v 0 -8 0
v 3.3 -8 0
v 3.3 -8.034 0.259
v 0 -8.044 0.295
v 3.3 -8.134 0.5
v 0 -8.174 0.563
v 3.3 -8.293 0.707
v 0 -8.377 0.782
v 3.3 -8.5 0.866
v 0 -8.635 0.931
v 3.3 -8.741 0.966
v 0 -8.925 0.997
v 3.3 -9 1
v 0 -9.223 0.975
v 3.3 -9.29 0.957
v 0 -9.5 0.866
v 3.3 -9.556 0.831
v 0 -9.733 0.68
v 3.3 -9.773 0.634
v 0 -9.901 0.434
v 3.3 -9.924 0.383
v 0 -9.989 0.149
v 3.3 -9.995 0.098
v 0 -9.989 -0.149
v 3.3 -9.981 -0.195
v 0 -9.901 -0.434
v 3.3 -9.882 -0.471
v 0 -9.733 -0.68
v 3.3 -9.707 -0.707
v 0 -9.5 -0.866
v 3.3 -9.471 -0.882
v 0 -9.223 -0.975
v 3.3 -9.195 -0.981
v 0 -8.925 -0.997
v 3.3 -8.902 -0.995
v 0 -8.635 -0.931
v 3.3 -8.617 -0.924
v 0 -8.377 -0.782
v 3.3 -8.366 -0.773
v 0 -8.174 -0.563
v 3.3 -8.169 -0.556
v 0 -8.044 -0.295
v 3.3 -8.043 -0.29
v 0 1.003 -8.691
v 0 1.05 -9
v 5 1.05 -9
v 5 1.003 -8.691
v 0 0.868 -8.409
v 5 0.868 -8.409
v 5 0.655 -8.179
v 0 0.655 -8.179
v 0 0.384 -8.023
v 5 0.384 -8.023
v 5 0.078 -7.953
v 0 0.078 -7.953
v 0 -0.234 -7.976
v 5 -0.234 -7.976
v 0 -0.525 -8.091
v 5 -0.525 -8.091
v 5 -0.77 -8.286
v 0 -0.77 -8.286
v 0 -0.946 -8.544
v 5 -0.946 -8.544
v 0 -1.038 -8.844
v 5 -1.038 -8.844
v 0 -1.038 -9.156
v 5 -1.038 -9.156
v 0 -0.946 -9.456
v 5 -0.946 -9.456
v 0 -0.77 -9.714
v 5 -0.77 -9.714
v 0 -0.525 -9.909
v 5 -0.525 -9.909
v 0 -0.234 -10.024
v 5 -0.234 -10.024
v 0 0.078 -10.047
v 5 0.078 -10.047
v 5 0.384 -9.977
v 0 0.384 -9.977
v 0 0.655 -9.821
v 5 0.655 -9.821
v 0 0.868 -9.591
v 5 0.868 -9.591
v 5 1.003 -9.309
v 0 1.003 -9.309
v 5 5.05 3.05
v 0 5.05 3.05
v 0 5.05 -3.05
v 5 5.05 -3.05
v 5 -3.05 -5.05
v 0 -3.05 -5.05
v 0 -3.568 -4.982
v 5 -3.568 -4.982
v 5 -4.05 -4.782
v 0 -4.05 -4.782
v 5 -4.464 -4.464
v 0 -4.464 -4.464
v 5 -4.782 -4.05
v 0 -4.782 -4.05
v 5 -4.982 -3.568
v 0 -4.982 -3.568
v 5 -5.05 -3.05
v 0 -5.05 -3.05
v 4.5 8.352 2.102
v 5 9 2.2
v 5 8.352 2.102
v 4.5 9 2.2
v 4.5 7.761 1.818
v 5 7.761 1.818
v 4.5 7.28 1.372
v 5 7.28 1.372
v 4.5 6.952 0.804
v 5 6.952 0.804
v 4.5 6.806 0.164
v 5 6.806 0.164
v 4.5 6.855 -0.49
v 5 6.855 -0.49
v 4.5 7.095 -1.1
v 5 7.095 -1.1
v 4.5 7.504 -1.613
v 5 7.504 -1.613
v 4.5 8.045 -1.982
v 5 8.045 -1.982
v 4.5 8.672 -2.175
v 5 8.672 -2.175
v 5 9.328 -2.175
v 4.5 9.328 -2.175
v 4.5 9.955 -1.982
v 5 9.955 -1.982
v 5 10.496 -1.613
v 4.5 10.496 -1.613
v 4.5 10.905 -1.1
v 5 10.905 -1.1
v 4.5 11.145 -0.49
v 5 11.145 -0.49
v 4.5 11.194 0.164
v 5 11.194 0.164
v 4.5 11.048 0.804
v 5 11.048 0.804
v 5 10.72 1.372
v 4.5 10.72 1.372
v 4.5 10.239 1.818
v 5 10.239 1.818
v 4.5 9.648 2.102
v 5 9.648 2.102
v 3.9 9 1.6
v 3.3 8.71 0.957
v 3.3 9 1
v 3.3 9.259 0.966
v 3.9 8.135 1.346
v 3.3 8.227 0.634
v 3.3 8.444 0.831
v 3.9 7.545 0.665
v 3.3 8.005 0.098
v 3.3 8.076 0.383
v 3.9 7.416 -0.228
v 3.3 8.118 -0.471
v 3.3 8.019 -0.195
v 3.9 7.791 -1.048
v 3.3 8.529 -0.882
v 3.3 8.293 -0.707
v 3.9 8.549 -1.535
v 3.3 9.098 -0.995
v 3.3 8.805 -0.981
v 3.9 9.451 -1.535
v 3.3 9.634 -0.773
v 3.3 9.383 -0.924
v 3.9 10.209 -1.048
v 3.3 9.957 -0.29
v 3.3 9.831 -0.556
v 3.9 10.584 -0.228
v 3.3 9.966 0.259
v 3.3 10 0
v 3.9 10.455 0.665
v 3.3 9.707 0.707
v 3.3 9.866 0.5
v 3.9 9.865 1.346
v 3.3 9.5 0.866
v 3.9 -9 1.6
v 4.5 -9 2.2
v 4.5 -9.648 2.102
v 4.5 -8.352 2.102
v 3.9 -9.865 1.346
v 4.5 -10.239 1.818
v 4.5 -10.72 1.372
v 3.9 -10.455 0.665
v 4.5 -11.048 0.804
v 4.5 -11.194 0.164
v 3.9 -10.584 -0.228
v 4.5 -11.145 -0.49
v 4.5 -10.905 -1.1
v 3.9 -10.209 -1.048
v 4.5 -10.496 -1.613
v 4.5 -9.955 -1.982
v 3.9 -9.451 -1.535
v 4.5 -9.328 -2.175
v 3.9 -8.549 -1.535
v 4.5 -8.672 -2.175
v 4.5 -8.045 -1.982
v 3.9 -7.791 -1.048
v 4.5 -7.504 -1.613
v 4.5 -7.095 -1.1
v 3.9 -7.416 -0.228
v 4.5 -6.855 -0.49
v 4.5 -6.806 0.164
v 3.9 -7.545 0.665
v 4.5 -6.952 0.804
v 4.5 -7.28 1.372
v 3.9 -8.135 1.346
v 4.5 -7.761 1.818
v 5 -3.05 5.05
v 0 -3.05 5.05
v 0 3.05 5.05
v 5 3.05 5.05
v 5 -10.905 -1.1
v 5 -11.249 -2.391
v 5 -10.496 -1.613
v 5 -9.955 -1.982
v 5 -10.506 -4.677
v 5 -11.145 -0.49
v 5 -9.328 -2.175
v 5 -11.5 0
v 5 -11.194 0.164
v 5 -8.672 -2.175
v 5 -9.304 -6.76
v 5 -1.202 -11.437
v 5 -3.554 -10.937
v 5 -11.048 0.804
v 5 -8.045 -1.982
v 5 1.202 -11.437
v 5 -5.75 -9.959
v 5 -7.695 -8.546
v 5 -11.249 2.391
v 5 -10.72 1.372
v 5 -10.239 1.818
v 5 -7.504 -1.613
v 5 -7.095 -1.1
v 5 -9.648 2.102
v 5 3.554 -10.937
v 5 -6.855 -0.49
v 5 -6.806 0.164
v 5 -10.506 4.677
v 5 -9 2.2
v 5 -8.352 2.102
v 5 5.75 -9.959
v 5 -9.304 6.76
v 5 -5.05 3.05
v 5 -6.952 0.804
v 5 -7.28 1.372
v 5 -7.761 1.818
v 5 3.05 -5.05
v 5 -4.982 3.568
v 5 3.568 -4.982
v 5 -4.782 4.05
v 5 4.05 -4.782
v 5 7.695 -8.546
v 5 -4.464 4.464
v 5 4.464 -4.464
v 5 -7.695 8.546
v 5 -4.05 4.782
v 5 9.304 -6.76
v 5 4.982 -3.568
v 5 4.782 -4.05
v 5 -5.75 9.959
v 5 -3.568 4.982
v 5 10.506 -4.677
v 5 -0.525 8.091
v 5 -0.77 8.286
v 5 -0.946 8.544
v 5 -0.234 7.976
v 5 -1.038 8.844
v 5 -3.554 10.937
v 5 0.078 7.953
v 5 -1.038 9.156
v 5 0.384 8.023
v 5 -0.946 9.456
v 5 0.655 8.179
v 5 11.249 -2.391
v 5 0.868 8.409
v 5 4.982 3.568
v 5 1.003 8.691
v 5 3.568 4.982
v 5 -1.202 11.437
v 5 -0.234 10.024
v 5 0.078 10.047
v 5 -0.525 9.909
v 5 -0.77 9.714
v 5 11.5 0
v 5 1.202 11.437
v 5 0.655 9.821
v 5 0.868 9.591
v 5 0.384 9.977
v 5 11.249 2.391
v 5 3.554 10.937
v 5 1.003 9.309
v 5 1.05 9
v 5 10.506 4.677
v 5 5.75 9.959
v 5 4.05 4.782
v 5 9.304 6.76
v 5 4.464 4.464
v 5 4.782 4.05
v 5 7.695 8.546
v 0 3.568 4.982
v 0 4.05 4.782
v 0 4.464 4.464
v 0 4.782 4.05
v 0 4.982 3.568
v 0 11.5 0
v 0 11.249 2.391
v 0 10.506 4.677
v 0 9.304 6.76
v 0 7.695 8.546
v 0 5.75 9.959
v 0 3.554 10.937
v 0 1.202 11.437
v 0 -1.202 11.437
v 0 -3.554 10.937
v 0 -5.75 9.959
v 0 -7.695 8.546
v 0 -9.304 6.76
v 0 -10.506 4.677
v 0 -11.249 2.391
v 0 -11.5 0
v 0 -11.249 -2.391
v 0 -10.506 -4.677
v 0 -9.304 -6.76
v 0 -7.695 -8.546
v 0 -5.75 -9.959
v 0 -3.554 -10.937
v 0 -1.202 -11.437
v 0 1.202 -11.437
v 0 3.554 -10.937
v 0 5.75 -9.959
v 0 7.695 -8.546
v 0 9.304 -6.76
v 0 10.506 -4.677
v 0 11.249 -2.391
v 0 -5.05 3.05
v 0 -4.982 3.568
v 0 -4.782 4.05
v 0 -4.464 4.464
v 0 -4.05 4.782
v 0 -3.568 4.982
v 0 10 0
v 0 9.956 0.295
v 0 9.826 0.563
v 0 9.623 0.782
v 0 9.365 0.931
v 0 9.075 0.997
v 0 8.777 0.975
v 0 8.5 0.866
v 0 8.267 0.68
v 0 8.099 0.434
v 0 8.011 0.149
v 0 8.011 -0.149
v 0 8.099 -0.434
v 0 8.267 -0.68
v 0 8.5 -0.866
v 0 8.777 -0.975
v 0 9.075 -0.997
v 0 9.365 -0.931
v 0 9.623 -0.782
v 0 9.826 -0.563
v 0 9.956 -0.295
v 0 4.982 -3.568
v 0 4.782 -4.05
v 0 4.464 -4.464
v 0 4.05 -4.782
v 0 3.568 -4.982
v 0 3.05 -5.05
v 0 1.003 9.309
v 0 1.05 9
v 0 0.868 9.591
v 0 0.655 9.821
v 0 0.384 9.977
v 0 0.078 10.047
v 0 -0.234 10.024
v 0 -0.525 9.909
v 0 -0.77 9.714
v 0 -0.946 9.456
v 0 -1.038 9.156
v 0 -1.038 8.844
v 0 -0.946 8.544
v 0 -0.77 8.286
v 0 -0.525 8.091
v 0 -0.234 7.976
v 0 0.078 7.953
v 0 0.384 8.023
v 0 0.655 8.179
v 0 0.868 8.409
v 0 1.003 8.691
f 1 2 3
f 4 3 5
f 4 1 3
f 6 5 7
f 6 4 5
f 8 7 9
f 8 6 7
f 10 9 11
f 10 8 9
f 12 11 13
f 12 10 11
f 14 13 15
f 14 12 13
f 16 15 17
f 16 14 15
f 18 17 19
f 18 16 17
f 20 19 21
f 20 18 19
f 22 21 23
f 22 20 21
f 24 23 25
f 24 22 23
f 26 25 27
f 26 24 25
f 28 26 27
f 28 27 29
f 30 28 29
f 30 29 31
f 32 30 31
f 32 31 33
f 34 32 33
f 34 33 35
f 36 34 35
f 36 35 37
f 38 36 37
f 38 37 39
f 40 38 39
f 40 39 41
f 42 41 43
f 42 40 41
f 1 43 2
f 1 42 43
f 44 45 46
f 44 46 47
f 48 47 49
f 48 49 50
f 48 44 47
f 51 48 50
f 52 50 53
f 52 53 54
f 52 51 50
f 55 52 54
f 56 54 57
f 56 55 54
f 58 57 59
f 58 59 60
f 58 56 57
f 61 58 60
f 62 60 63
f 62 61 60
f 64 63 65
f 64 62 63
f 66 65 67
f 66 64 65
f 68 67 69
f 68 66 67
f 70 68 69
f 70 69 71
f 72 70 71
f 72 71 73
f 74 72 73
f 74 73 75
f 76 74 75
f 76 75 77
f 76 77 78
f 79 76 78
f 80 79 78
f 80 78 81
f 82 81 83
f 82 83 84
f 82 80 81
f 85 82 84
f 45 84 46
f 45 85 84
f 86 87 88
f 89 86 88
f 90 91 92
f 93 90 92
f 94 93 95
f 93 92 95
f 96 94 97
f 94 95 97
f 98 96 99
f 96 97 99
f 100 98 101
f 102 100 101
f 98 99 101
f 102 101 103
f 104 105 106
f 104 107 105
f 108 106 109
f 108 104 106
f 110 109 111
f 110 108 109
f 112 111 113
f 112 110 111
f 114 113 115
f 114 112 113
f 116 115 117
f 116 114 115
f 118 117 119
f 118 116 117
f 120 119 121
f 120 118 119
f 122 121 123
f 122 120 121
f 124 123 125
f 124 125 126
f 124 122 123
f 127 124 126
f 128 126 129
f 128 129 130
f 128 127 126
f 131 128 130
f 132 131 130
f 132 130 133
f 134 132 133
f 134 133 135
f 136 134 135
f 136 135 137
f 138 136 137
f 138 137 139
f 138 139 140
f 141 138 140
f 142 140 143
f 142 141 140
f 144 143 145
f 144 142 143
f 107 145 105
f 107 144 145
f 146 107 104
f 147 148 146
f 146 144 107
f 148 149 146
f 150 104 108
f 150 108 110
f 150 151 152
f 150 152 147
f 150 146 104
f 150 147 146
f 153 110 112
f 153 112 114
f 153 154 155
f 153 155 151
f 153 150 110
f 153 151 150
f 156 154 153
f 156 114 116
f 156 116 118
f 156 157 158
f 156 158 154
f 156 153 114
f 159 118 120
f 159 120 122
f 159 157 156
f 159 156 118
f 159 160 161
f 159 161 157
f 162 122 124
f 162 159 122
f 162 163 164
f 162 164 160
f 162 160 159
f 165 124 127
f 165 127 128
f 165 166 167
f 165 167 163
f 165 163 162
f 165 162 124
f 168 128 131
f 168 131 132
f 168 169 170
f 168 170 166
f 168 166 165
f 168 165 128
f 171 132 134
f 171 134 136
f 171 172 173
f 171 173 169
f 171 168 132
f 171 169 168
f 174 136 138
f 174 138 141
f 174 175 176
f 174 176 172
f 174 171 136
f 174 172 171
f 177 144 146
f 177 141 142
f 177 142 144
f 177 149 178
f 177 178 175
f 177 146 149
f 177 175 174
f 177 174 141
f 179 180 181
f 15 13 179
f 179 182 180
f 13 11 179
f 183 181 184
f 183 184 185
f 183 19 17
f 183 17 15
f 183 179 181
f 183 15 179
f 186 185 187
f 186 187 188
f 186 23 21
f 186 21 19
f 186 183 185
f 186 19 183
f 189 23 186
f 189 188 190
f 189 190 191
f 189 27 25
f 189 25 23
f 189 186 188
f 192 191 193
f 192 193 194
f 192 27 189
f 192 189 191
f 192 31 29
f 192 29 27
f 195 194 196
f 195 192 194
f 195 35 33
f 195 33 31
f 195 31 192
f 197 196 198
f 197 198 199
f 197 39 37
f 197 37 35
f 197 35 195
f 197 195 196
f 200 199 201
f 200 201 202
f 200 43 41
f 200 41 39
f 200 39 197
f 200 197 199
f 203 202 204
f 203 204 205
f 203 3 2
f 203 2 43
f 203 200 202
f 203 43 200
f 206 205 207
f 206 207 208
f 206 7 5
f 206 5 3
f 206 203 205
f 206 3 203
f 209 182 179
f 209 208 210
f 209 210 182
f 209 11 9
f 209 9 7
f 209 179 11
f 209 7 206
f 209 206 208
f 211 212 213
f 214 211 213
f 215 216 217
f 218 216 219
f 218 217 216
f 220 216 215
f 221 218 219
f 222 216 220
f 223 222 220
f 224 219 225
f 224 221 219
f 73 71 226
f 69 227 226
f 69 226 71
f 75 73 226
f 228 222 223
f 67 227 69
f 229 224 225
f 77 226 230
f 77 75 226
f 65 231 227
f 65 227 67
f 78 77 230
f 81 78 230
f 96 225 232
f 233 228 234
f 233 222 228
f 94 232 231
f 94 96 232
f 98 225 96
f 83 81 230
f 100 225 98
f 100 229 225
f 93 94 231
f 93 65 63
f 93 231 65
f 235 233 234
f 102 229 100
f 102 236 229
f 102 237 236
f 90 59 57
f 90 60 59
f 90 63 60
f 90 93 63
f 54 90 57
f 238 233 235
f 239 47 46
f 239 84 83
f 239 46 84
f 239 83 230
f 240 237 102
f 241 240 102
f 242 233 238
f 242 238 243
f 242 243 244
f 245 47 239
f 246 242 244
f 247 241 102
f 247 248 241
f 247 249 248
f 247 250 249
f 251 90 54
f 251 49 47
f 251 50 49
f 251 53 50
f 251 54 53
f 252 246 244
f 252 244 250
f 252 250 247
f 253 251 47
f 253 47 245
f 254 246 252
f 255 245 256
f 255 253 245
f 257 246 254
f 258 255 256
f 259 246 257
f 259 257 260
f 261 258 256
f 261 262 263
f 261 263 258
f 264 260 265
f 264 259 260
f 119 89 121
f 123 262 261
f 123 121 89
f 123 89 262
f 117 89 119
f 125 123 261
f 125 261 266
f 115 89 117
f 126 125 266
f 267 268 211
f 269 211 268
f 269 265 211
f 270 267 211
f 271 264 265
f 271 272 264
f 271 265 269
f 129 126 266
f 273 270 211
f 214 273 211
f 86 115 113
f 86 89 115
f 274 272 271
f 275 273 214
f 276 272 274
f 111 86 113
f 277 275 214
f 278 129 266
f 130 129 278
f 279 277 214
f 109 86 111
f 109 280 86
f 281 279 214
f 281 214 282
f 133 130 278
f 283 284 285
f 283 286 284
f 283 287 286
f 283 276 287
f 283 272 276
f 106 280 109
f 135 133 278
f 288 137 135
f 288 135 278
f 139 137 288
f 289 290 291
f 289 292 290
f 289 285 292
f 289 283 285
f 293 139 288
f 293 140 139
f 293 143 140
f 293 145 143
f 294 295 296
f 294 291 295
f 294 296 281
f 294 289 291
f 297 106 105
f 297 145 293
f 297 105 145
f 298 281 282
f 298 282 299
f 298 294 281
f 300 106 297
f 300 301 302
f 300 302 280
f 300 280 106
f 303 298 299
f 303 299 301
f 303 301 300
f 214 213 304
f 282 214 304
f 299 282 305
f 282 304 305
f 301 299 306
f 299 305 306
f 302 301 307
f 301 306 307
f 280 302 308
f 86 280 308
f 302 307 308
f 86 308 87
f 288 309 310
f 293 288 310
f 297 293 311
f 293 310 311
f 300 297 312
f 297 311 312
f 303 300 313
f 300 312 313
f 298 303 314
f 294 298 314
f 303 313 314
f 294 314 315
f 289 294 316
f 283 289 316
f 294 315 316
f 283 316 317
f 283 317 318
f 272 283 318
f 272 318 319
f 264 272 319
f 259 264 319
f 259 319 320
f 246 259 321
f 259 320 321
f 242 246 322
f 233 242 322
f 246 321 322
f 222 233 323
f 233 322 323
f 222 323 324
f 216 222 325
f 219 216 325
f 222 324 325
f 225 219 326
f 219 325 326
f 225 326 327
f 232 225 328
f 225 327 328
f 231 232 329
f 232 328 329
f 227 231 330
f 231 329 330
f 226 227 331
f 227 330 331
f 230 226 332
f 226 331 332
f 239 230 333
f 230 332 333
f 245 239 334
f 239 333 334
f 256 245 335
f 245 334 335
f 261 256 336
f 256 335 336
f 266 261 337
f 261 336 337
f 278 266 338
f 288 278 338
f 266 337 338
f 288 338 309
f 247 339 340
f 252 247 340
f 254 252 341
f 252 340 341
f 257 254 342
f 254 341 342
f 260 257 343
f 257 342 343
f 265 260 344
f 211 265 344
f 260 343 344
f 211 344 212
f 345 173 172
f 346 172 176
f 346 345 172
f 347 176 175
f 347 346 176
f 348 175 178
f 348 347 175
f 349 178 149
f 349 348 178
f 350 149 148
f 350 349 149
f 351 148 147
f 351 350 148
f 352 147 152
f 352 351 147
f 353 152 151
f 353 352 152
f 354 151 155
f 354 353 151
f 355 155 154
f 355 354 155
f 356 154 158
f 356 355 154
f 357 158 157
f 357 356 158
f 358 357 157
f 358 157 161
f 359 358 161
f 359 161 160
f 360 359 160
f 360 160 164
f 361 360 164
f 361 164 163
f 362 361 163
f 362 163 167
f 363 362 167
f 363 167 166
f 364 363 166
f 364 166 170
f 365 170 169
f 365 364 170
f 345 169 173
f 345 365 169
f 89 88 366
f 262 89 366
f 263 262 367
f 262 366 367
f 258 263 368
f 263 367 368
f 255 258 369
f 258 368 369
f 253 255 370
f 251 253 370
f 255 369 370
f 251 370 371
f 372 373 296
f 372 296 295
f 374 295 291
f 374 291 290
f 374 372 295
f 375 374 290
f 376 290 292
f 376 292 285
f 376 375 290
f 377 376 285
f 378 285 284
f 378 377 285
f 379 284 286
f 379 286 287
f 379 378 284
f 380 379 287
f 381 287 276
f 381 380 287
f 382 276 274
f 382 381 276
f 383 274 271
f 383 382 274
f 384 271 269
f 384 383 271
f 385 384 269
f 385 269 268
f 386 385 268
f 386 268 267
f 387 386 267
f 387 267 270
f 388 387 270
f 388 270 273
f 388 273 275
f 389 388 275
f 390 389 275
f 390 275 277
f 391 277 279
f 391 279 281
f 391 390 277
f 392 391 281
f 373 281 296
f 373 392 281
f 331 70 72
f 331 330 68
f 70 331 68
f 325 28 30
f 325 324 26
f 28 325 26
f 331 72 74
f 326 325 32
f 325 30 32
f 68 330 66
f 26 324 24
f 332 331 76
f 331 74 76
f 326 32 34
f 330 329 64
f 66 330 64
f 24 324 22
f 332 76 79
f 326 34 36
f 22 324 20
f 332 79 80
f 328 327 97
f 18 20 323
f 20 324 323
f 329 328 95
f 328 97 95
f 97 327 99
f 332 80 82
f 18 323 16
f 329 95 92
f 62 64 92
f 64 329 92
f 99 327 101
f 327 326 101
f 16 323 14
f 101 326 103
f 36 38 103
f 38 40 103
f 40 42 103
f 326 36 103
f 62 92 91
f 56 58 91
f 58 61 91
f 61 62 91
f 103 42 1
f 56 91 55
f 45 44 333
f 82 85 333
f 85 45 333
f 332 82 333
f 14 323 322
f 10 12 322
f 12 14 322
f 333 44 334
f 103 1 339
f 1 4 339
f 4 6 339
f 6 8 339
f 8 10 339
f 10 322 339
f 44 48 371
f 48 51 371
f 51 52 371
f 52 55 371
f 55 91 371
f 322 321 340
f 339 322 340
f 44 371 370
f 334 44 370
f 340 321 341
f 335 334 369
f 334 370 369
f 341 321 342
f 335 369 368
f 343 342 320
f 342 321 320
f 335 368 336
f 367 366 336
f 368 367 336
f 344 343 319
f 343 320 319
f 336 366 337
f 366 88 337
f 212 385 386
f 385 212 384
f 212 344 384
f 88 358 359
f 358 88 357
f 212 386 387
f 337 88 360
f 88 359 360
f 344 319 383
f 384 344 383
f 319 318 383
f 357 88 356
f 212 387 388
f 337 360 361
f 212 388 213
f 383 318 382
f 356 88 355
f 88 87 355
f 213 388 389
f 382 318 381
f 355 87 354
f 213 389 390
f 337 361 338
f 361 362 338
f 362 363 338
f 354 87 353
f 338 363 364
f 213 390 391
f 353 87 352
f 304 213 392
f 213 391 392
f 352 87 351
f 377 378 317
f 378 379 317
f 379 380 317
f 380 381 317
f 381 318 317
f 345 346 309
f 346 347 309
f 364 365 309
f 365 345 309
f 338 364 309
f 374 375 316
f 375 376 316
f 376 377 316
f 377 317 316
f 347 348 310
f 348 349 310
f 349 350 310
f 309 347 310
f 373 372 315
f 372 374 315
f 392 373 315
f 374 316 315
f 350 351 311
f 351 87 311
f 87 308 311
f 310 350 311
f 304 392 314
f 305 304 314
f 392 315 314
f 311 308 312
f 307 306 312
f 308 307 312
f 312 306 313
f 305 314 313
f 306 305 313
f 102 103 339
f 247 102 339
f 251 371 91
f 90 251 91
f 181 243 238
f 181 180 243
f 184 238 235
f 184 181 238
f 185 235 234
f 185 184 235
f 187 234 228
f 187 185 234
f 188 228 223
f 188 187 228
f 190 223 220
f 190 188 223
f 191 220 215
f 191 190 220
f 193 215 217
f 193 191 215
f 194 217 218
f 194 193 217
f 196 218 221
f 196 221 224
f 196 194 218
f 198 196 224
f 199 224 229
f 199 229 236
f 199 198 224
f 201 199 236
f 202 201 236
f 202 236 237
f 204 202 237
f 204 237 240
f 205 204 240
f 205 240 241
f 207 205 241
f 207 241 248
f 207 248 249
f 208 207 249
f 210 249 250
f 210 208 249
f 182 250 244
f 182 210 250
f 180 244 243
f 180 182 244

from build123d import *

# Parameters (mm, degrees)
F0_R     = 11.5
F0_R_2   = 1.05
F0_R_3   = 1
F1_DEPTH = 5


with BuildPart() as f1:
    # F0 (on Right) → F1 (new body)
    with BuildSketch(Plane.YZ):
        Circle(F0_R)
        with Locations((0, -9)):
            Circle(F0_R_2, mode=Mode.SUBTRACT)
        with Locations((-9, 0)):
            Circle(F0_R_3, mode=Mode.SUBTRACT)
        with BuildLine():
            ThreePointArc((-5.05, 3.05), (-4.464214, 4.464214), (-3.05, 5.05))
            Line((-3.05, 5.05), (3.05, 5.05))
            ThreePointArc((3.05, 5.05), (4.464214, 4.464214), (5.05, 3.05))
            Line((5.05, 3.05), (5.05, -3.05))
            ThreePointArc((5.05, -3.05), (4.464214, -4.464214), (3.05, -5.05))
            Line((3.05, -5.05), (-3.05, -5.05))
            ThreePointArc((-3.05, -5.05), (-4.464214, -4.464214), (-5.05, -3.05))
            Line((-5.05, -3.05), (-5.05, 3.05))
        make_face(mode=Mode.SUBTRACT)
        with Locations((9, 0)):
            Circle(F0_R_3, mode=Mode.SUBTRACT)
        with Locations((0, 9)):
            Circle(F0_R_2, mode=Mode.SUBTRACT)
    extrude(amount=F1_DEPTH)

    # F3 (on offset) → F5 (revolve, cut)
    with BuildSketch(Plane.XZ.offset(9)):
        Polygon((2.3, 0), (5, 0), (5, 2.2), (4.5, 2.2), align=None)
    revolve(axis=Axis((2.750115, -9, 0), (1, 0, 0)), mode=Mode.SUBTRACT)

    # F7 (on offset) → F8 (revolve, cut)
    with BuildSketch(Plane.XZ.offset(-9)):
        Polygon((4.5, 2.2), (2.3, 0), (5, 0), (5, 2.2), align=None)
    revolve(axis=Axis((3.65, 9, 0), (1, 0, 0)), mode=Mode.SUBTRACT)


solid = f1.part
